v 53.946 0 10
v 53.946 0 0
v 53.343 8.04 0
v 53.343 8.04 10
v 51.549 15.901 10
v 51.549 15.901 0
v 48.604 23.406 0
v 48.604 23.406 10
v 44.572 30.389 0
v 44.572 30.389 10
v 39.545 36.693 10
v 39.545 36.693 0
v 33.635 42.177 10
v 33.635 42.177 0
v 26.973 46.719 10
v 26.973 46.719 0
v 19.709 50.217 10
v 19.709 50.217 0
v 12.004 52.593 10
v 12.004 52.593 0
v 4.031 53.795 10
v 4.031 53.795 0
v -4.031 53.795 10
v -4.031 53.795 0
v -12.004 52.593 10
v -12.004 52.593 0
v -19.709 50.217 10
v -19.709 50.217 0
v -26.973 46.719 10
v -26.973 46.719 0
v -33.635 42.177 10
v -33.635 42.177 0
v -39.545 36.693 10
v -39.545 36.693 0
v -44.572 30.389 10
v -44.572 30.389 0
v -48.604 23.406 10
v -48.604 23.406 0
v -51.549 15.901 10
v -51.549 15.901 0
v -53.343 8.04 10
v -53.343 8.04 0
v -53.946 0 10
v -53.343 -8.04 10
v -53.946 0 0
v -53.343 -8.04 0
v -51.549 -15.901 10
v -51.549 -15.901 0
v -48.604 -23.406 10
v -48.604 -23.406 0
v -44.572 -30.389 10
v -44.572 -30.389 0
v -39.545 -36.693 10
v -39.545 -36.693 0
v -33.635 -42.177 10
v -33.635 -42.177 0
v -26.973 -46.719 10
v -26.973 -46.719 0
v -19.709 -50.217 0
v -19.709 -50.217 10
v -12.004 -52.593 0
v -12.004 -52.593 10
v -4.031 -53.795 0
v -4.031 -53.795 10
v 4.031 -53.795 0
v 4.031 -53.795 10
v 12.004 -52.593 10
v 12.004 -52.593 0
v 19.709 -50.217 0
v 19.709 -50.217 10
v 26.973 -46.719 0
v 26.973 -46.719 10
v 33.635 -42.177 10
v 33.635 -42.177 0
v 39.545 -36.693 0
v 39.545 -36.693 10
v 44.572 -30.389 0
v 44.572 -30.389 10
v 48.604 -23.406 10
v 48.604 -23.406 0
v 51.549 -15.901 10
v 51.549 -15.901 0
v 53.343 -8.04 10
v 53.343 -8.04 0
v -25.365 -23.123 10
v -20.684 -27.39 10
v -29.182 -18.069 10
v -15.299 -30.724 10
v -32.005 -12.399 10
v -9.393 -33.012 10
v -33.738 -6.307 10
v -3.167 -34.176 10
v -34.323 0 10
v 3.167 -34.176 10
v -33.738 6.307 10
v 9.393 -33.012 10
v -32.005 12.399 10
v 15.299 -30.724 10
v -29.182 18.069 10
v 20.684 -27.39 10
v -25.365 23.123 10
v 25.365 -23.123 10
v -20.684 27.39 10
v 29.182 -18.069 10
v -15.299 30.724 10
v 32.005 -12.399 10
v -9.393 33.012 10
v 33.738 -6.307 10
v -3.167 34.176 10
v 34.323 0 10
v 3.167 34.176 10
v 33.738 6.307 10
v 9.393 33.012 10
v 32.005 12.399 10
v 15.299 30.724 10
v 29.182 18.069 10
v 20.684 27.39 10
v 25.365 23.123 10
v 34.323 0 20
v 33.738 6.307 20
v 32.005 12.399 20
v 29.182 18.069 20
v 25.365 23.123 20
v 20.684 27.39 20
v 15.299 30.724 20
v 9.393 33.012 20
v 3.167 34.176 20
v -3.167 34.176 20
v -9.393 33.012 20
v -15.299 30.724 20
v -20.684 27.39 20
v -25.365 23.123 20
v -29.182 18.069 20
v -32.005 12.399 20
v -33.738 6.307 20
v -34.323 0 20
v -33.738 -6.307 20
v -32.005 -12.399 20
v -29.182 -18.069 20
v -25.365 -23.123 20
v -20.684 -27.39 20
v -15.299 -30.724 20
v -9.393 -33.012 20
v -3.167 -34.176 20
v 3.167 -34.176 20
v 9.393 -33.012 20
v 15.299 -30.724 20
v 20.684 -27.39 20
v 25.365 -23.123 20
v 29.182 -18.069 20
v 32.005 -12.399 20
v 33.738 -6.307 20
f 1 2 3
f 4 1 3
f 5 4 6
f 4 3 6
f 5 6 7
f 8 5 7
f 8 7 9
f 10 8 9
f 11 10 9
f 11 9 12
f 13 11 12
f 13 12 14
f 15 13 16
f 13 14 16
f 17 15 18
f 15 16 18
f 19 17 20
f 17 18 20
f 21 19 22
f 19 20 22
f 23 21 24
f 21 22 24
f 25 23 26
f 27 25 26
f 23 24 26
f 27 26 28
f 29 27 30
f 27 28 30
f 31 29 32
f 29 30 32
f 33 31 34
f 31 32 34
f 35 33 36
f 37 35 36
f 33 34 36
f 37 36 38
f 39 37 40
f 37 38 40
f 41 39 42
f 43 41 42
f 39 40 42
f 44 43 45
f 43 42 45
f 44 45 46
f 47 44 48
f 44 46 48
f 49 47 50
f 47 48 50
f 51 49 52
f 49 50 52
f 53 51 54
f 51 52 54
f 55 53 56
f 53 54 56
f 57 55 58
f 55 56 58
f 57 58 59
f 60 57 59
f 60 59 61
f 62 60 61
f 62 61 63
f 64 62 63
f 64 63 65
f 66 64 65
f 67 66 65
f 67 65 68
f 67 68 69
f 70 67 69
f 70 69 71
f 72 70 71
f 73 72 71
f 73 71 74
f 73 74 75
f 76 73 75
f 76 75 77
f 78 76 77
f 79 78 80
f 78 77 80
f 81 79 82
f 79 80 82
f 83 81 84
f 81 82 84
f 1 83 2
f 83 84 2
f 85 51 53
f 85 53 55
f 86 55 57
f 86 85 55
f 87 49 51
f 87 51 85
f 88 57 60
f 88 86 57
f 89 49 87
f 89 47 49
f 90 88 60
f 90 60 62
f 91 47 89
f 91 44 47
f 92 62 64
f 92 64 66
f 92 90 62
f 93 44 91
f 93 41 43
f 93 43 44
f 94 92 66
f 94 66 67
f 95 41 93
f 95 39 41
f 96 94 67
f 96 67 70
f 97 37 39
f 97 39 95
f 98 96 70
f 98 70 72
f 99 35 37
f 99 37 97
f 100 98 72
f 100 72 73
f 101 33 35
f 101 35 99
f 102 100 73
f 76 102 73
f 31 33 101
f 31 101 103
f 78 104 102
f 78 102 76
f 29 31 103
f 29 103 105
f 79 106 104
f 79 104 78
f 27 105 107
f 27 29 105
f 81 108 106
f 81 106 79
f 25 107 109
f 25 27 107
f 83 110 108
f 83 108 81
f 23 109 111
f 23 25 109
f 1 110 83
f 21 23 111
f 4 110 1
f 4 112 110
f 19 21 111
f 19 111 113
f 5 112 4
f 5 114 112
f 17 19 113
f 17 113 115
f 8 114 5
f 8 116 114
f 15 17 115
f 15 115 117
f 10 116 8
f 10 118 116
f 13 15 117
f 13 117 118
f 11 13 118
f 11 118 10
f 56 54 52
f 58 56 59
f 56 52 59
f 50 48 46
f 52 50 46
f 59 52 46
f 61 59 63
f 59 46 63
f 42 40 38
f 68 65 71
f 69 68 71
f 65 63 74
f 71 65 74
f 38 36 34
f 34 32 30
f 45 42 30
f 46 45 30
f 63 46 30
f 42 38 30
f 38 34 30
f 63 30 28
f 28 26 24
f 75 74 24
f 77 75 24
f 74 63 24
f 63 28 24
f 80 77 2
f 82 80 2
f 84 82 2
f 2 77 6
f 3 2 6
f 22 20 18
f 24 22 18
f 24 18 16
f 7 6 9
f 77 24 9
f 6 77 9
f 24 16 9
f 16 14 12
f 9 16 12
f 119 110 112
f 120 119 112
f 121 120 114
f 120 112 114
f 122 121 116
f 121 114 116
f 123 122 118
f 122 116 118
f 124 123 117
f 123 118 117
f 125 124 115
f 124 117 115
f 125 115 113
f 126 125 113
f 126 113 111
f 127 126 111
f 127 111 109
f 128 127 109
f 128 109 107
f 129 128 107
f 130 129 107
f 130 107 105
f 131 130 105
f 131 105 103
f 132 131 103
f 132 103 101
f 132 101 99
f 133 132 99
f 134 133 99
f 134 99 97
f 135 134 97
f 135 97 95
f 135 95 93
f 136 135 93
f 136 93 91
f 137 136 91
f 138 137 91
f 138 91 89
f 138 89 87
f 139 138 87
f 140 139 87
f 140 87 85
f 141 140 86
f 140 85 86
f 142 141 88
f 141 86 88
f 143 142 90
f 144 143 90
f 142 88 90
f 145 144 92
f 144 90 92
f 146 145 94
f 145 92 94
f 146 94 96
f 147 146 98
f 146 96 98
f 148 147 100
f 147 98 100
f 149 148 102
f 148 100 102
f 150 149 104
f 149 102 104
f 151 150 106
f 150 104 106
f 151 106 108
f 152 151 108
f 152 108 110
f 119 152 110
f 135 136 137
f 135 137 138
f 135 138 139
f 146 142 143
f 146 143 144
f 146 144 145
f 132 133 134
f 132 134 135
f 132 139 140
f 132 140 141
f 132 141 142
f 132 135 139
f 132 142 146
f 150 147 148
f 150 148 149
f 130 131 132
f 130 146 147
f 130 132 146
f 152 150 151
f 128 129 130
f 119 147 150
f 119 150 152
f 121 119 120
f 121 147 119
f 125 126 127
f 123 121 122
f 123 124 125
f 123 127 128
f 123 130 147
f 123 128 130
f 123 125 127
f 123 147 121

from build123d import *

# Parameters (mm, degrees)
F0_R     = 34.322698
F1_DEPTH = 20
F2_R     = 53.945988
F3_DEPTH = 10
F4_R     = 45.735873
F5_DEPTH = 10


with BuildPart() as f1:
    # F0 (on Top) → F1 (new body)
    with BuildSketch(Plane.XY):
        Circle(F0_R)
    extrude(amount=F1_DEPTH)

    # F2 (on Top) → F3 (join)
    with BuildSketch(Plane.XY):
        Circle(F2_R)
    extrude(amount=F3_DEPTH)

    # F4 (on Top) → F5 (join)
    with BuildSketch(Plane.XY):
        Circle(F4_R)
    extrude(amount=F5_DEPTH)


solid = f1.part
